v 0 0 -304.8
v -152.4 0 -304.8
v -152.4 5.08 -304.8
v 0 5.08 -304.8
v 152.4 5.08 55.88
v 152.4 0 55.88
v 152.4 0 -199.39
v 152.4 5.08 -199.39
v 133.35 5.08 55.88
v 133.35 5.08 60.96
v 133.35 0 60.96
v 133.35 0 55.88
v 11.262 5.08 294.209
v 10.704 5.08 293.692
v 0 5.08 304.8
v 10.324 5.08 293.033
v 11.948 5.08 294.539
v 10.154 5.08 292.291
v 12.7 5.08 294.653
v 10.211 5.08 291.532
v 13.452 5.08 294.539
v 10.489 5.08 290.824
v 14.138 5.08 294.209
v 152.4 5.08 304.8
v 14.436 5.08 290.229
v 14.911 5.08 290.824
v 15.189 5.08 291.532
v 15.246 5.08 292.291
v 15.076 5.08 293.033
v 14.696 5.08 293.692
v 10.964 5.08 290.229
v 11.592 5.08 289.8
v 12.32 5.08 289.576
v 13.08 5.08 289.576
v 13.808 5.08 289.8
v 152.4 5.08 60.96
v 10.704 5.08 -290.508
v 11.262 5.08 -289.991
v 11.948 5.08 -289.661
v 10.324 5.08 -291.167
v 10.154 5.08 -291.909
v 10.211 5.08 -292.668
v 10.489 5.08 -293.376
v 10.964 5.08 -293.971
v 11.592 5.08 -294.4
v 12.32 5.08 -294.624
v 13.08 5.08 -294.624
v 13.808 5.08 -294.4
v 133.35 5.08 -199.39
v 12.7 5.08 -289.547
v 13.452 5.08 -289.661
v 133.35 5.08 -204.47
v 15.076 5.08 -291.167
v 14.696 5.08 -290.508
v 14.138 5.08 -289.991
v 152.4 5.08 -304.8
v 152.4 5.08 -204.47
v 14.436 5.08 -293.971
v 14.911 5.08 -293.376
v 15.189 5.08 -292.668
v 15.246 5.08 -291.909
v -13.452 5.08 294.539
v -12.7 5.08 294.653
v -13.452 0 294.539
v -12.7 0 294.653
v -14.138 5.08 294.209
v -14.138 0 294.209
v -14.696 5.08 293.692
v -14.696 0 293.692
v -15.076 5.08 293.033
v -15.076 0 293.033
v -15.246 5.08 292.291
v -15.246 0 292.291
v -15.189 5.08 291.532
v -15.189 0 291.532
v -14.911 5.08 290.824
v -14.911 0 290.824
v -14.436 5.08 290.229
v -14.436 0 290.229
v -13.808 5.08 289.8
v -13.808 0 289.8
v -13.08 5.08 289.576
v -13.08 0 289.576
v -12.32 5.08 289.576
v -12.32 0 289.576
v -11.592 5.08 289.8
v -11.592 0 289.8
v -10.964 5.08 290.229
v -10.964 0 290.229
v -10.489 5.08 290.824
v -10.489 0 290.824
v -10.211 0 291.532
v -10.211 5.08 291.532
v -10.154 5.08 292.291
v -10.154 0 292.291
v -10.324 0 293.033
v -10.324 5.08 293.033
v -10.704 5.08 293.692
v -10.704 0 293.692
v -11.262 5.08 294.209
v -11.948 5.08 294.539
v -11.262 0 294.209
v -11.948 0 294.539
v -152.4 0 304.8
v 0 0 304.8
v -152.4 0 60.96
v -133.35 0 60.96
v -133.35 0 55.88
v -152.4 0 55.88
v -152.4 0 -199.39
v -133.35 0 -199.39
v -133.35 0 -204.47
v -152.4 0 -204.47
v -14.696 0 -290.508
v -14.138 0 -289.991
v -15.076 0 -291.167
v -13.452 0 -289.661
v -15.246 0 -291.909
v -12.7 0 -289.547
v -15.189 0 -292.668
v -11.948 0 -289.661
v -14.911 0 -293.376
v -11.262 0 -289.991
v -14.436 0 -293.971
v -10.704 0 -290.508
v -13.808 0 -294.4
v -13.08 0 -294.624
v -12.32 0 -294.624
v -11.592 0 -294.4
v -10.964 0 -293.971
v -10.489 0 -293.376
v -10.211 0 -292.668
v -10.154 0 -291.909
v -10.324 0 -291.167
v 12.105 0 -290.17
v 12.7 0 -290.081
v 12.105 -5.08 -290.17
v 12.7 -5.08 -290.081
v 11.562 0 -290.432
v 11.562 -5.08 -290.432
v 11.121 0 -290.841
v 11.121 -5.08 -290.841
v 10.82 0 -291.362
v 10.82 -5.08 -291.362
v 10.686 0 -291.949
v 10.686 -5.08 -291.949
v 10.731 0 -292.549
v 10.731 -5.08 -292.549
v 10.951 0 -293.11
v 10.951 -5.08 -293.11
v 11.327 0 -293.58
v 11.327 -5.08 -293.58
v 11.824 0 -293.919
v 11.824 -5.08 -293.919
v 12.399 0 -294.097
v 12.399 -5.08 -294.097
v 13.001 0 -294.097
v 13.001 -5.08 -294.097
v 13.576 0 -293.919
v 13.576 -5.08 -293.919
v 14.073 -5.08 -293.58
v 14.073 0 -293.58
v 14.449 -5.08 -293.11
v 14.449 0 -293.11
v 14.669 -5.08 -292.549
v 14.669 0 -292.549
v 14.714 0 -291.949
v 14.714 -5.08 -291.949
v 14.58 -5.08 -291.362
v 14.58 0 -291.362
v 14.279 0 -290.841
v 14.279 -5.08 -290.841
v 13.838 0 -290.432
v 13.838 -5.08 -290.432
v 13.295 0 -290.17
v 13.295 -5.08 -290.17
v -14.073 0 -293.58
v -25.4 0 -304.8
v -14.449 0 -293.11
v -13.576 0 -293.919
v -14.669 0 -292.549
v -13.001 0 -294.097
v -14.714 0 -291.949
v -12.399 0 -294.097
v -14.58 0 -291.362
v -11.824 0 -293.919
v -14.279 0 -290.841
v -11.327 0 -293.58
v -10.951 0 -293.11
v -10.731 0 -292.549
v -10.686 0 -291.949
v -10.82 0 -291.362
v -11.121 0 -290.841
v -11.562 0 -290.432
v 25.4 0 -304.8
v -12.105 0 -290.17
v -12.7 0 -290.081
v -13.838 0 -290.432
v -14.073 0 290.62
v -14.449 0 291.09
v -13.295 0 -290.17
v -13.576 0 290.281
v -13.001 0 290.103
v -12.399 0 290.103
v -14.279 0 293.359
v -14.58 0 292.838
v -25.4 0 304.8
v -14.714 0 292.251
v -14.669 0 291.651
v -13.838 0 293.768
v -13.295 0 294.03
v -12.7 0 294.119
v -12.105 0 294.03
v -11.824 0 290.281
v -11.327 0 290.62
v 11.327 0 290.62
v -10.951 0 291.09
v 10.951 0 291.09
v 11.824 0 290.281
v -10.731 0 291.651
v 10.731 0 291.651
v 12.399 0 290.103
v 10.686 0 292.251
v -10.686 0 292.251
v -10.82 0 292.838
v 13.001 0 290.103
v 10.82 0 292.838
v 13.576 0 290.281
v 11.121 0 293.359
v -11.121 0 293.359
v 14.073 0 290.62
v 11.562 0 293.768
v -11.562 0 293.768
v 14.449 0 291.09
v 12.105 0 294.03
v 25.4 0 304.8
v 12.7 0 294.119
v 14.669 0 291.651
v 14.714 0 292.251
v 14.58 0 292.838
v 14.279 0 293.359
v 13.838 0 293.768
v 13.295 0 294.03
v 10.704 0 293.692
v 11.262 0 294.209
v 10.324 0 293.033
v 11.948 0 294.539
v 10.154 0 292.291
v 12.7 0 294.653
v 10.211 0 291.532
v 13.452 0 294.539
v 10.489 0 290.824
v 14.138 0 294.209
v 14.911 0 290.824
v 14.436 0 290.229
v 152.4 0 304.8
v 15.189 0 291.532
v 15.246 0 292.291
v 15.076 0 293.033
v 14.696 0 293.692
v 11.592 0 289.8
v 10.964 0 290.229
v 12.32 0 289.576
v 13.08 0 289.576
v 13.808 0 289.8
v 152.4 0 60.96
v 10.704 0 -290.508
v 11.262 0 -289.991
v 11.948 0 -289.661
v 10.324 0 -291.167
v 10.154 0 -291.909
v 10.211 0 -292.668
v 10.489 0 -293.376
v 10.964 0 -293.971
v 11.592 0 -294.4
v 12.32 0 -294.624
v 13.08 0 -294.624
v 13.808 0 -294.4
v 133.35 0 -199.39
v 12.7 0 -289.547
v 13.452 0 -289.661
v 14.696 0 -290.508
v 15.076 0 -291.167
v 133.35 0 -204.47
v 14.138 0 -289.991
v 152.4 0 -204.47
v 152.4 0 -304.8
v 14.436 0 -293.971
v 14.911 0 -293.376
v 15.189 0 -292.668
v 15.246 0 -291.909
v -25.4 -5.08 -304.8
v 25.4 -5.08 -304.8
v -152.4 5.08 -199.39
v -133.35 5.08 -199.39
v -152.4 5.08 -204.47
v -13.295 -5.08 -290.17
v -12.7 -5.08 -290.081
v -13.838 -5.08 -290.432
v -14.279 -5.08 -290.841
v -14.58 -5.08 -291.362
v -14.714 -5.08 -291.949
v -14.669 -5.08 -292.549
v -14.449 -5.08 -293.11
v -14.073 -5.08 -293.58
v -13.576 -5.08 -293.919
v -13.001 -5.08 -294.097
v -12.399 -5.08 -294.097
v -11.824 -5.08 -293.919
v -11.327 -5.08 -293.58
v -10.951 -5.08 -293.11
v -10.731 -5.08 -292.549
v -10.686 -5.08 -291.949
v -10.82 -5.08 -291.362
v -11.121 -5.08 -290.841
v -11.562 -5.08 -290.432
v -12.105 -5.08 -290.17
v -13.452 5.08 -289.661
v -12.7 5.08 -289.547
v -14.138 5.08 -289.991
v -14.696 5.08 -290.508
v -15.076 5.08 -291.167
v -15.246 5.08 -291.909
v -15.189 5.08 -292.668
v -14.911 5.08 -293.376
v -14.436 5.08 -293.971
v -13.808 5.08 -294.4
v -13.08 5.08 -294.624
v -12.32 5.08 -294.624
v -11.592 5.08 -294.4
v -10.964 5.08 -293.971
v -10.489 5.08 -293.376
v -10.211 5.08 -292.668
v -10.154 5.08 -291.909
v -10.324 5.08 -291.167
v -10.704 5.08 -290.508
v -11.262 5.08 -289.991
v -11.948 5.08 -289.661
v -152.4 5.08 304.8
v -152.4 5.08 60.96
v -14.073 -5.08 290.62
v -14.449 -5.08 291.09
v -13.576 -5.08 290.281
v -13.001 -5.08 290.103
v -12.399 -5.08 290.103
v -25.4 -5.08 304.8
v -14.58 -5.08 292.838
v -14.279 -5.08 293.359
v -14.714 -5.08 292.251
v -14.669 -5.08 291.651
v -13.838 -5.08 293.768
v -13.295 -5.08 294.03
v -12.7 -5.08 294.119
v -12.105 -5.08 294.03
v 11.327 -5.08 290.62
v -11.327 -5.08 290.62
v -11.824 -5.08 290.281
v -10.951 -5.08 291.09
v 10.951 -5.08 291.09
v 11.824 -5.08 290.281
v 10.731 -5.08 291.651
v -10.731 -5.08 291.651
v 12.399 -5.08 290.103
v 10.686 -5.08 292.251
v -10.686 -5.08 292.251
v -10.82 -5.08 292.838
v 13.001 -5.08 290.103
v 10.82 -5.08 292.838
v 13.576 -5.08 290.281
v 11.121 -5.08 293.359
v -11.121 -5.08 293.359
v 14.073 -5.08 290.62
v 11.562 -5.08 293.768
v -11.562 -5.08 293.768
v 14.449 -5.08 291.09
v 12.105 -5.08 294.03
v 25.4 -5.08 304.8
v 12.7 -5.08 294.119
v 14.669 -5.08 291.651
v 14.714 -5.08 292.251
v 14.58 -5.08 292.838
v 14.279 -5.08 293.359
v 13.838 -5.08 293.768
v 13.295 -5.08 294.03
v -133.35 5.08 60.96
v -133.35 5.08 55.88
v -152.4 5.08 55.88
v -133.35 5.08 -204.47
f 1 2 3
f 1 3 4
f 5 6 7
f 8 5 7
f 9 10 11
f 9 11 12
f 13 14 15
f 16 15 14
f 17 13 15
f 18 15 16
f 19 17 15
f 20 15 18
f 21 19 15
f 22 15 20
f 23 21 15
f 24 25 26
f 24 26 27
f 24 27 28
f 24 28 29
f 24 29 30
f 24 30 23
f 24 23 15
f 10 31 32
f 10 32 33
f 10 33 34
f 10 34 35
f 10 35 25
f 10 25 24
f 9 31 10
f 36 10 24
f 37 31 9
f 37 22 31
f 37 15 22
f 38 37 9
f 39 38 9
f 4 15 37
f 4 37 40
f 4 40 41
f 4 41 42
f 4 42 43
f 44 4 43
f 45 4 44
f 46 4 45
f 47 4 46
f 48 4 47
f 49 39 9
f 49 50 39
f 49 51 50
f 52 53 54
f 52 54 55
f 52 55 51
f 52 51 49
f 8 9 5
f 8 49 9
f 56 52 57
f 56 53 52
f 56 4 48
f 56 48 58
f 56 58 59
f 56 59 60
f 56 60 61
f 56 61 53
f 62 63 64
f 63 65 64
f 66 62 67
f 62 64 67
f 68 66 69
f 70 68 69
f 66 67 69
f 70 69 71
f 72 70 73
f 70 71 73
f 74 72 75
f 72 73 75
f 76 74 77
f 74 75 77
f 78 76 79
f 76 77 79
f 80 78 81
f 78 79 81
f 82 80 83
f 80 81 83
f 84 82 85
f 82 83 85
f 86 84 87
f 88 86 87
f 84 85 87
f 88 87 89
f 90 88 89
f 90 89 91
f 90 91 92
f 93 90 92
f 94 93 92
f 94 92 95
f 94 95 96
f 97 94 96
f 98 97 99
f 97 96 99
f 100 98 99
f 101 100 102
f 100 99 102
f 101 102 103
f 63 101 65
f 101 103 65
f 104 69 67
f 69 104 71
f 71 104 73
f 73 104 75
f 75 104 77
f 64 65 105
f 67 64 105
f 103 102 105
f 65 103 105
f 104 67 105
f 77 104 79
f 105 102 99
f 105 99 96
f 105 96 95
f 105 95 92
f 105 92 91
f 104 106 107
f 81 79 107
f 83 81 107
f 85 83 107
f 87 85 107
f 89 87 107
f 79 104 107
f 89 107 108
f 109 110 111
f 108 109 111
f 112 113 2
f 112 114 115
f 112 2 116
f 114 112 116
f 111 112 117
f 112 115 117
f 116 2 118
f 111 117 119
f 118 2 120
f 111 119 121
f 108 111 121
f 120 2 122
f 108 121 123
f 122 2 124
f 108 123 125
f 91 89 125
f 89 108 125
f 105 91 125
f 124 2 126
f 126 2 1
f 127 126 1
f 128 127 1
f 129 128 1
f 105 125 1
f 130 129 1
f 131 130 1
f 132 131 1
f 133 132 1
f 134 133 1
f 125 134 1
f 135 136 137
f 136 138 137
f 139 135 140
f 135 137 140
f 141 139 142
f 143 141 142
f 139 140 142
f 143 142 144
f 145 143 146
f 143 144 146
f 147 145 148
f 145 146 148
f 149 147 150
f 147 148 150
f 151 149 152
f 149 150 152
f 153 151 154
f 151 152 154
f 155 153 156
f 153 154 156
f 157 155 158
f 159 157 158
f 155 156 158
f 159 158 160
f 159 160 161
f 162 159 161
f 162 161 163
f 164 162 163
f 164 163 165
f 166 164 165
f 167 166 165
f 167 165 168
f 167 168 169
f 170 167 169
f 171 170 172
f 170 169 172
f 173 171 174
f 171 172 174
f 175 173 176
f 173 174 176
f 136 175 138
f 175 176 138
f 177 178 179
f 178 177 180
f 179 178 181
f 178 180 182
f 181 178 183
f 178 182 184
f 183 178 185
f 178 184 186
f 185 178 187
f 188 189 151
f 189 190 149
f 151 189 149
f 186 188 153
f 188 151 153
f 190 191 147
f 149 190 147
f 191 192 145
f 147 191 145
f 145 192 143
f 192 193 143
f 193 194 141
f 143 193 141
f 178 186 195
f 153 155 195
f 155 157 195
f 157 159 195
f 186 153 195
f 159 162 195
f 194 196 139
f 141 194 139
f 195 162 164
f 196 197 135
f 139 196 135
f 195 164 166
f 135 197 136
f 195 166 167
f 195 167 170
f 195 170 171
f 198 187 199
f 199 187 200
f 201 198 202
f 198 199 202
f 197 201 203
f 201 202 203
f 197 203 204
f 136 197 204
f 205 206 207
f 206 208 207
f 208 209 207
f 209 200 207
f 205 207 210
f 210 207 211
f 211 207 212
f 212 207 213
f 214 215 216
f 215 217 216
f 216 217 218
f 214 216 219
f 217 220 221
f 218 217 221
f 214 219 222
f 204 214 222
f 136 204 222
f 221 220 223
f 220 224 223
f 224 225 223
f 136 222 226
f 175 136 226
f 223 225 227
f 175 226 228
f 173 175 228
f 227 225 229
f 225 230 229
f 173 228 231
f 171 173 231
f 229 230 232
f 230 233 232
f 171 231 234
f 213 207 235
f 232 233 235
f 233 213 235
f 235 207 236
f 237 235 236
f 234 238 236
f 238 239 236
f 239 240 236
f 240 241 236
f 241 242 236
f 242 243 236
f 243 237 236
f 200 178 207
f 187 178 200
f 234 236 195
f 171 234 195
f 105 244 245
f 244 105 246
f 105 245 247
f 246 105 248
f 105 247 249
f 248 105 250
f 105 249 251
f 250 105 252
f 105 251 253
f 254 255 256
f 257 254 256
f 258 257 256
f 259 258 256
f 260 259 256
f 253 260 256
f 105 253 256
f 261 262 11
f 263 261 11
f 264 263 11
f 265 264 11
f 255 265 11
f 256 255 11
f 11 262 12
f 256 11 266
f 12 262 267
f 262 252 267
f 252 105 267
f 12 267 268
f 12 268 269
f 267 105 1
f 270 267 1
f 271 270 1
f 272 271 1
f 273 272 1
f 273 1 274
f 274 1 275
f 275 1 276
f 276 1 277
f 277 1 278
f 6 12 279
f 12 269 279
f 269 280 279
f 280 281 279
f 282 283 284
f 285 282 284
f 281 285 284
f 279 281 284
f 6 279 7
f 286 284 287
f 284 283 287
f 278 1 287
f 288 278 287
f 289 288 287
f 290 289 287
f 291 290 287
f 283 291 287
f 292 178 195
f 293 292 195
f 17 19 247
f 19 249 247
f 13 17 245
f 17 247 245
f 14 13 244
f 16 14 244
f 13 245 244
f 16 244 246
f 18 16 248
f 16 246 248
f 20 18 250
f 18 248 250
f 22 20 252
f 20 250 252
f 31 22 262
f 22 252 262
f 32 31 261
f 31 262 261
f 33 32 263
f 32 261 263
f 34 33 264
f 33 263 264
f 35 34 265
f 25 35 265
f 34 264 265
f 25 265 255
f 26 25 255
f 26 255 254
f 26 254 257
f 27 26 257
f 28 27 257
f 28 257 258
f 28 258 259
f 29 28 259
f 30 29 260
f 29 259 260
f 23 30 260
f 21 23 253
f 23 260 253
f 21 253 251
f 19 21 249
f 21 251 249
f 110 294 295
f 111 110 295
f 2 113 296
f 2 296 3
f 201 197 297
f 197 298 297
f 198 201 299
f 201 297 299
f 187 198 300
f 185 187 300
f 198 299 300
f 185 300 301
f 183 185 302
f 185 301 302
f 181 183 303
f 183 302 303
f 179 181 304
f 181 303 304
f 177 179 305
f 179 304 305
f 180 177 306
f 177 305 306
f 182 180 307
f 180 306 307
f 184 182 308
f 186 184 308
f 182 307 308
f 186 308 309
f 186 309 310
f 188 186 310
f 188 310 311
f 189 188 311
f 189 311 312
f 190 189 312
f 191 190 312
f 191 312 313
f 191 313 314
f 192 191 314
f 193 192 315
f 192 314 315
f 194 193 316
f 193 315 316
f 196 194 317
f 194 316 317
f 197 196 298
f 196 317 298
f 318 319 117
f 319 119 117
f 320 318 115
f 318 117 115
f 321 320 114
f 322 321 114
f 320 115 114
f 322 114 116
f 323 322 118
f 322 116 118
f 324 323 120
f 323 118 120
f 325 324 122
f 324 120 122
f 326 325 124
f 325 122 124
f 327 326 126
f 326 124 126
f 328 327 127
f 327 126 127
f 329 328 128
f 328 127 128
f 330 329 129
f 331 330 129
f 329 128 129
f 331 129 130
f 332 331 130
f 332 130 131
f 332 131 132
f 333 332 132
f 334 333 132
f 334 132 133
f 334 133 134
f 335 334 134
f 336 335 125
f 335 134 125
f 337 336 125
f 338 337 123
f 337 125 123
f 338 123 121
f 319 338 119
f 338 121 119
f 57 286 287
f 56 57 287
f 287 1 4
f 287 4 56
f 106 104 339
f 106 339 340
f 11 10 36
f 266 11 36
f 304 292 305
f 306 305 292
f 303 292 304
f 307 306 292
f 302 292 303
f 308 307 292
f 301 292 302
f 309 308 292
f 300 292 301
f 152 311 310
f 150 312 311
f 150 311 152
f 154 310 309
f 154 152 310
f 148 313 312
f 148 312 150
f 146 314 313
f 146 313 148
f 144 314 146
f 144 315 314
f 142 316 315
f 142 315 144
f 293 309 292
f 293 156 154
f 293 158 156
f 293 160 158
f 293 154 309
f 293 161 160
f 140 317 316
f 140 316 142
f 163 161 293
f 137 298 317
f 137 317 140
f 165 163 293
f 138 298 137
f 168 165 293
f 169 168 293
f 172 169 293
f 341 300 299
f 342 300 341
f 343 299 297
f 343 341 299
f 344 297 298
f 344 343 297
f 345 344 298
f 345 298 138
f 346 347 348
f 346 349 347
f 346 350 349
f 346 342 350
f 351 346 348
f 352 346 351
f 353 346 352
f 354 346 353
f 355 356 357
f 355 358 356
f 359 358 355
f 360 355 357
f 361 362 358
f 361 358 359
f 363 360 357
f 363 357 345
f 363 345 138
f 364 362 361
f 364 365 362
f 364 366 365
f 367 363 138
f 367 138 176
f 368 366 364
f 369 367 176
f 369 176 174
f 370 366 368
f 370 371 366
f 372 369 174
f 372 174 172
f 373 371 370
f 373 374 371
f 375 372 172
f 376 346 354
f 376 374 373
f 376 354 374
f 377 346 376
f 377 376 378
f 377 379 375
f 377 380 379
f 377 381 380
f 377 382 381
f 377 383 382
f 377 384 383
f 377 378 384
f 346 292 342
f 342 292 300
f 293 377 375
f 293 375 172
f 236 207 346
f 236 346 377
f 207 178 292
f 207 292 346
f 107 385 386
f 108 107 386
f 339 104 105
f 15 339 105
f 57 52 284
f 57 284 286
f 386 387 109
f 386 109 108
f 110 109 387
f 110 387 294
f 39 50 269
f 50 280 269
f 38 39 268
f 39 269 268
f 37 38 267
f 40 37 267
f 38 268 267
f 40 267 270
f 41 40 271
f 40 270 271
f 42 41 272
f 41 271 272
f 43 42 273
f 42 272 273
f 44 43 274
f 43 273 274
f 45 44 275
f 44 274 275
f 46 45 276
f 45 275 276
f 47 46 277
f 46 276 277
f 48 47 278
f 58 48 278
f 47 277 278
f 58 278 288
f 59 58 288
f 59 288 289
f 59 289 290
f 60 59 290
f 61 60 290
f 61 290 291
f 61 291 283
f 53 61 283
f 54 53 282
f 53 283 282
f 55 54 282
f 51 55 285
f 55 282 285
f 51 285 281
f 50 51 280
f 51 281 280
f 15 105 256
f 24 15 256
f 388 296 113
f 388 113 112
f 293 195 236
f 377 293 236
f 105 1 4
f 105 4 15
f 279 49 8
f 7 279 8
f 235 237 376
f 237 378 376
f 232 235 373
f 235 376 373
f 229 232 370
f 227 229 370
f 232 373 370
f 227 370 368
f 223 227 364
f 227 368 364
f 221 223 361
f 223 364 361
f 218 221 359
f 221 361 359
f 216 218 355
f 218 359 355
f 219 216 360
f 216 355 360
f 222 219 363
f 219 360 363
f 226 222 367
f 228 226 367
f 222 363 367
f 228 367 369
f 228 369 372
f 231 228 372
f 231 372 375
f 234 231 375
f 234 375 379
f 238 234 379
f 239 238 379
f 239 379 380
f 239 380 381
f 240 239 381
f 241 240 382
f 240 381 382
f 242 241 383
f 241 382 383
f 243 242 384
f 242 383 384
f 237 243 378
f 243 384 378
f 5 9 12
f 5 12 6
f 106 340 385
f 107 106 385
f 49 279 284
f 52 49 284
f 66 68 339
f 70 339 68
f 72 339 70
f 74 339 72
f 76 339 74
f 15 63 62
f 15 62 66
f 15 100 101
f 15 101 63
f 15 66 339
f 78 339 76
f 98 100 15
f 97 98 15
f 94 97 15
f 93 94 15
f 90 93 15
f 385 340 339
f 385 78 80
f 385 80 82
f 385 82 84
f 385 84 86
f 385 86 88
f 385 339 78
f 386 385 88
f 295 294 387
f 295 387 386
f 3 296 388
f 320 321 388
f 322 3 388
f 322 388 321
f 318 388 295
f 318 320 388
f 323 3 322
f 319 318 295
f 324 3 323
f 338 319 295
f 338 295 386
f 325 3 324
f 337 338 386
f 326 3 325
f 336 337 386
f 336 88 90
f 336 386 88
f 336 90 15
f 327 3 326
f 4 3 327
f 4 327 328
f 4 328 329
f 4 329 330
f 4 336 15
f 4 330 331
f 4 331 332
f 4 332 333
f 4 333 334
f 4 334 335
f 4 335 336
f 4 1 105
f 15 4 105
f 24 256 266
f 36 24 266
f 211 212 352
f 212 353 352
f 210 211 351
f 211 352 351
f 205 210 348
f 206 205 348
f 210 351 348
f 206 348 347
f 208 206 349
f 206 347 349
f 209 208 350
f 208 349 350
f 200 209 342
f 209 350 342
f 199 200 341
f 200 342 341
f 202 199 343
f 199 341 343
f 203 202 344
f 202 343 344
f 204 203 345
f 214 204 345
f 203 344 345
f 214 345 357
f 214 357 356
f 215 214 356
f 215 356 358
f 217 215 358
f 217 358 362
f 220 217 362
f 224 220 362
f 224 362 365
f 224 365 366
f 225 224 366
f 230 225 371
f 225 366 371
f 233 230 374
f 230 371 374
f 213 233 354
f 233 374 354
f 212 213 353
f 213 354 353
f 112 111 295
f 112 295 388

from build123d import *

# Parameters (mm, degrees)
SKETCH1_W                       = 304.8
SKETCH1_H                       = 609.6
BOSS_EXTRUDE1_DEPTH             = 5.08
SKETCH2_W                       = 19.05
SKETCH2_H                       = 5.08
CUT_EXTRUDE1_DEPTH              = 6.08
SKETCH6_W                       = 2.5527
SKETCH6_H                       = 5.08
F_10_CLEARANCE_HOLE1_AT_2_COUNT = 2
F_10_CLEARANCE_HOLE1_AT_2_PITCH = 584.751913208
F_10_CLEARANCE_HOLE1_AT_3_COUNT = 2
F_10_CLEARANCE_HOLE1_AT_3_PITCH = 25.4
F_10_CLEARANCE_HOLE1_AT_4_COUNT = 2
F_10_CLEARANCE_HOLE1_AT_4_PITCH = 584.2
SKETCH7_W                       = 50.8
SKETCH7_H                       = 609.6
BOSS_EXTRUDE2_DEPTH             = 5.08
SKETCH9_W                       = 2.0193
SKETCH9_H                       = 5.08
F_10_32_TAPPED_HOLE1_AT_2_COUNT = 2
F_10_32_TAPPED_HOLE1_AT_2_PITCH = 25.4
F_10_32_TAPPED_HOLE1_AT_3_COUNT = 2
F_10_32_TAPPED_HOLE1_AT_3_PITCH = 584.2
F_10_32_TAPPED_HOLE1_AT_4_COUNT = 2
F_10_32_TAPPED_HOLE1_AT_4_PITCH = 584.751913208


with BuildPart() as part:
    # Sketch1 → Boss-Extrude1 (new body)
    with BuildSketch(Plane(origin=(0, 0, 0), x_dir=(1, 0, 0), z_dir=(0, 1, 0))):
        Rectangle(SKETCH1_W, SKETCH1_H)
    extrude(amount=BOSS_EXTRUDE1_DEPTH)

    # Sketch2 → Cut-Extrude1 (cut, through all)
    with BuildSketch(Plane(origin=(0, 5.08, 0), x_dir=(1, 0, 0), z_dir=(0, 1, 0))):
        with Locations((142.875, -58.42)):
            Rectangle(SKETCH2_W, SKETCH2_H)
        with Locations((142.875, 201.93)):
            Rectangle(SKETCH2_W, SKETCH2_H)
        with Locations((-142.875, 201.93)):
            Rectangle(SKETCH2_W, SKETCH2_H)
        with Locations((-142.875, -58.42)):
            Rectangle(SKETCH2_W, SKETCH2_H)
    extrude(amount=-CUT_EXTRUDE1_DEPTH, mode=Mode.SUBTRACT)


with BuildPart() as body_2:
    # Split1: the piece on the far side of the plane
    add(part.part)
    split(bisect_by=Plane(origin=(0, 0, 0), x_dir=(0, 0, 1), z_dir=(1, 0, 0)), keep=Keep.BOTTOM)

    # Sketch6 → #10 Clearance Hole1 (revolve, cut)
    with BuildSketch(Plane(origin=(-12.7, 5.08, -292.1), x_dir=(0, 0, 1), z_dir=(1, 0, 0))):
        with Locations((1.27635, 2.54)):
            Rectangle(SKETCH6_W, SKETCH6_H)
    f_10_clearance_hole1 = revolve(axis=Axis((-12.7, 11.43, -292.1), (0, -1, 0)), mode=Mode.SUBTRACT)

    # #10 Clearance Hole1 at 4: #10 Clearance Hole1 ×2
    with Locations(*[(0, 0, i * F_10_CLEARANCE_HOLE1_AT_4_PITCH) for i in range(1, F_10_CLEARANCE_HOLE1_AT_4_COUNT)]):
        add(f_10_clearance_hole1, mode=Mode.SUBTRACT)


with BuildPart() as part_1:
    add(part.part)

    # Split1
    split(bisect_by=Plane(origin=(0, 0, 0), x_dir=(0, 0, 1), z_dir=(1, 0, 0)), keep=Keep.TOP)

    # #10 Clearance Hole1 at 2: #10 Clearance Hole1 ×2
    with Locations(*[Vector(0.043437224, 0, 0.999056158) * (i * F_10_CLEARANCE_HOLE1_AT_2_PITCH) for i in range(1, F_10_CLEARANCE_HOLE1_AT_2_COUNT)]):
        add(f_10_clearance_hole1, mode=Mode.SUBTRACT)

    # #10 Clearance Hole1 at 3: #10 Clearance Hole1 ×2
    with Locations(*[(i * F_10_CLEARANCE_HOLE1_AT_3_PITCH, 0, 0) for i in range(1, F_10_CLEARANCE_HOLE1_AT_3_COUNT)]):
        add(f_10_clearance_hole1, mode=Mode.SUBTRACT)


with BuildPart() as body_3:
    # Sketch7 → Boss-Extrude2 (new body)
    with BuildSketch(Plane.XZ):
        Rectangle(SKETCH7_W, SKETCH7_H)
    extrude(amount=BOSS_EXTRUDE2_DEPTH)

    # Sketch9 → #10-32 Tapped Hole1 (revolve, cut)
    with BuildSketch(Plane(origin=(-12.7, 0, 292.1), x_dir=(0, 0, 1), z_dir=(1, 0, 0))):
        with Locations((1.00965, 2.54)):
            Rectangle(SKETCH9_W, SKETCH9_H)
    f_10_32_tapped_hole1 = revolve(axis=Axis((-12.7, 6.35, 292.1), (0, -1, 0)), mode=Mode.SUBTRACT)

    # #10-32 Tapped Hole1 at 2: #10-32 Tapped Hole1 ×2
    with Locations(*[(i * F_10_32_TAPPED_HOLE1_AT_2_PITCH, 0, 0) for i in range(1, F_10_32_TAPPED_HOLE1_AT_2_COUNT)]):
        add(f_10_32_tapped_hole1, mode=Mode.SUBTRACT)

    # #10-32 Tapped Hole1 at 3: #10-32 Tapped Hole1 ×2
    with Locations(*[(0, 0, -i * F_10_32_TAPPED_HOLE1_AT_3_PITCH) for i in range(1, F_10_32_TAPPED_HOLE1_AT_3_COUNT)]):
        add(f_10_32_tapped_hole1, mode=Mode.SUBTRACT)

    # #10-32 Tapped Hole1 at 4: #10-32 Tapped Hole1 ×2
    with Locations(*[Vector(0.043437224, 0, -0.999056158) * (i * F_10_32_TAPPED_HOLE1_AT_4_PITCH) for i in range(1, F_10_32_TAPPED_HOLE1_AT_4_COUNT)]):
        add(f_10_32_tapped_hole1, mode=Mode.SUBTRACT)


solid = Compound([body_2.part, part_1.part, body_3.part])
